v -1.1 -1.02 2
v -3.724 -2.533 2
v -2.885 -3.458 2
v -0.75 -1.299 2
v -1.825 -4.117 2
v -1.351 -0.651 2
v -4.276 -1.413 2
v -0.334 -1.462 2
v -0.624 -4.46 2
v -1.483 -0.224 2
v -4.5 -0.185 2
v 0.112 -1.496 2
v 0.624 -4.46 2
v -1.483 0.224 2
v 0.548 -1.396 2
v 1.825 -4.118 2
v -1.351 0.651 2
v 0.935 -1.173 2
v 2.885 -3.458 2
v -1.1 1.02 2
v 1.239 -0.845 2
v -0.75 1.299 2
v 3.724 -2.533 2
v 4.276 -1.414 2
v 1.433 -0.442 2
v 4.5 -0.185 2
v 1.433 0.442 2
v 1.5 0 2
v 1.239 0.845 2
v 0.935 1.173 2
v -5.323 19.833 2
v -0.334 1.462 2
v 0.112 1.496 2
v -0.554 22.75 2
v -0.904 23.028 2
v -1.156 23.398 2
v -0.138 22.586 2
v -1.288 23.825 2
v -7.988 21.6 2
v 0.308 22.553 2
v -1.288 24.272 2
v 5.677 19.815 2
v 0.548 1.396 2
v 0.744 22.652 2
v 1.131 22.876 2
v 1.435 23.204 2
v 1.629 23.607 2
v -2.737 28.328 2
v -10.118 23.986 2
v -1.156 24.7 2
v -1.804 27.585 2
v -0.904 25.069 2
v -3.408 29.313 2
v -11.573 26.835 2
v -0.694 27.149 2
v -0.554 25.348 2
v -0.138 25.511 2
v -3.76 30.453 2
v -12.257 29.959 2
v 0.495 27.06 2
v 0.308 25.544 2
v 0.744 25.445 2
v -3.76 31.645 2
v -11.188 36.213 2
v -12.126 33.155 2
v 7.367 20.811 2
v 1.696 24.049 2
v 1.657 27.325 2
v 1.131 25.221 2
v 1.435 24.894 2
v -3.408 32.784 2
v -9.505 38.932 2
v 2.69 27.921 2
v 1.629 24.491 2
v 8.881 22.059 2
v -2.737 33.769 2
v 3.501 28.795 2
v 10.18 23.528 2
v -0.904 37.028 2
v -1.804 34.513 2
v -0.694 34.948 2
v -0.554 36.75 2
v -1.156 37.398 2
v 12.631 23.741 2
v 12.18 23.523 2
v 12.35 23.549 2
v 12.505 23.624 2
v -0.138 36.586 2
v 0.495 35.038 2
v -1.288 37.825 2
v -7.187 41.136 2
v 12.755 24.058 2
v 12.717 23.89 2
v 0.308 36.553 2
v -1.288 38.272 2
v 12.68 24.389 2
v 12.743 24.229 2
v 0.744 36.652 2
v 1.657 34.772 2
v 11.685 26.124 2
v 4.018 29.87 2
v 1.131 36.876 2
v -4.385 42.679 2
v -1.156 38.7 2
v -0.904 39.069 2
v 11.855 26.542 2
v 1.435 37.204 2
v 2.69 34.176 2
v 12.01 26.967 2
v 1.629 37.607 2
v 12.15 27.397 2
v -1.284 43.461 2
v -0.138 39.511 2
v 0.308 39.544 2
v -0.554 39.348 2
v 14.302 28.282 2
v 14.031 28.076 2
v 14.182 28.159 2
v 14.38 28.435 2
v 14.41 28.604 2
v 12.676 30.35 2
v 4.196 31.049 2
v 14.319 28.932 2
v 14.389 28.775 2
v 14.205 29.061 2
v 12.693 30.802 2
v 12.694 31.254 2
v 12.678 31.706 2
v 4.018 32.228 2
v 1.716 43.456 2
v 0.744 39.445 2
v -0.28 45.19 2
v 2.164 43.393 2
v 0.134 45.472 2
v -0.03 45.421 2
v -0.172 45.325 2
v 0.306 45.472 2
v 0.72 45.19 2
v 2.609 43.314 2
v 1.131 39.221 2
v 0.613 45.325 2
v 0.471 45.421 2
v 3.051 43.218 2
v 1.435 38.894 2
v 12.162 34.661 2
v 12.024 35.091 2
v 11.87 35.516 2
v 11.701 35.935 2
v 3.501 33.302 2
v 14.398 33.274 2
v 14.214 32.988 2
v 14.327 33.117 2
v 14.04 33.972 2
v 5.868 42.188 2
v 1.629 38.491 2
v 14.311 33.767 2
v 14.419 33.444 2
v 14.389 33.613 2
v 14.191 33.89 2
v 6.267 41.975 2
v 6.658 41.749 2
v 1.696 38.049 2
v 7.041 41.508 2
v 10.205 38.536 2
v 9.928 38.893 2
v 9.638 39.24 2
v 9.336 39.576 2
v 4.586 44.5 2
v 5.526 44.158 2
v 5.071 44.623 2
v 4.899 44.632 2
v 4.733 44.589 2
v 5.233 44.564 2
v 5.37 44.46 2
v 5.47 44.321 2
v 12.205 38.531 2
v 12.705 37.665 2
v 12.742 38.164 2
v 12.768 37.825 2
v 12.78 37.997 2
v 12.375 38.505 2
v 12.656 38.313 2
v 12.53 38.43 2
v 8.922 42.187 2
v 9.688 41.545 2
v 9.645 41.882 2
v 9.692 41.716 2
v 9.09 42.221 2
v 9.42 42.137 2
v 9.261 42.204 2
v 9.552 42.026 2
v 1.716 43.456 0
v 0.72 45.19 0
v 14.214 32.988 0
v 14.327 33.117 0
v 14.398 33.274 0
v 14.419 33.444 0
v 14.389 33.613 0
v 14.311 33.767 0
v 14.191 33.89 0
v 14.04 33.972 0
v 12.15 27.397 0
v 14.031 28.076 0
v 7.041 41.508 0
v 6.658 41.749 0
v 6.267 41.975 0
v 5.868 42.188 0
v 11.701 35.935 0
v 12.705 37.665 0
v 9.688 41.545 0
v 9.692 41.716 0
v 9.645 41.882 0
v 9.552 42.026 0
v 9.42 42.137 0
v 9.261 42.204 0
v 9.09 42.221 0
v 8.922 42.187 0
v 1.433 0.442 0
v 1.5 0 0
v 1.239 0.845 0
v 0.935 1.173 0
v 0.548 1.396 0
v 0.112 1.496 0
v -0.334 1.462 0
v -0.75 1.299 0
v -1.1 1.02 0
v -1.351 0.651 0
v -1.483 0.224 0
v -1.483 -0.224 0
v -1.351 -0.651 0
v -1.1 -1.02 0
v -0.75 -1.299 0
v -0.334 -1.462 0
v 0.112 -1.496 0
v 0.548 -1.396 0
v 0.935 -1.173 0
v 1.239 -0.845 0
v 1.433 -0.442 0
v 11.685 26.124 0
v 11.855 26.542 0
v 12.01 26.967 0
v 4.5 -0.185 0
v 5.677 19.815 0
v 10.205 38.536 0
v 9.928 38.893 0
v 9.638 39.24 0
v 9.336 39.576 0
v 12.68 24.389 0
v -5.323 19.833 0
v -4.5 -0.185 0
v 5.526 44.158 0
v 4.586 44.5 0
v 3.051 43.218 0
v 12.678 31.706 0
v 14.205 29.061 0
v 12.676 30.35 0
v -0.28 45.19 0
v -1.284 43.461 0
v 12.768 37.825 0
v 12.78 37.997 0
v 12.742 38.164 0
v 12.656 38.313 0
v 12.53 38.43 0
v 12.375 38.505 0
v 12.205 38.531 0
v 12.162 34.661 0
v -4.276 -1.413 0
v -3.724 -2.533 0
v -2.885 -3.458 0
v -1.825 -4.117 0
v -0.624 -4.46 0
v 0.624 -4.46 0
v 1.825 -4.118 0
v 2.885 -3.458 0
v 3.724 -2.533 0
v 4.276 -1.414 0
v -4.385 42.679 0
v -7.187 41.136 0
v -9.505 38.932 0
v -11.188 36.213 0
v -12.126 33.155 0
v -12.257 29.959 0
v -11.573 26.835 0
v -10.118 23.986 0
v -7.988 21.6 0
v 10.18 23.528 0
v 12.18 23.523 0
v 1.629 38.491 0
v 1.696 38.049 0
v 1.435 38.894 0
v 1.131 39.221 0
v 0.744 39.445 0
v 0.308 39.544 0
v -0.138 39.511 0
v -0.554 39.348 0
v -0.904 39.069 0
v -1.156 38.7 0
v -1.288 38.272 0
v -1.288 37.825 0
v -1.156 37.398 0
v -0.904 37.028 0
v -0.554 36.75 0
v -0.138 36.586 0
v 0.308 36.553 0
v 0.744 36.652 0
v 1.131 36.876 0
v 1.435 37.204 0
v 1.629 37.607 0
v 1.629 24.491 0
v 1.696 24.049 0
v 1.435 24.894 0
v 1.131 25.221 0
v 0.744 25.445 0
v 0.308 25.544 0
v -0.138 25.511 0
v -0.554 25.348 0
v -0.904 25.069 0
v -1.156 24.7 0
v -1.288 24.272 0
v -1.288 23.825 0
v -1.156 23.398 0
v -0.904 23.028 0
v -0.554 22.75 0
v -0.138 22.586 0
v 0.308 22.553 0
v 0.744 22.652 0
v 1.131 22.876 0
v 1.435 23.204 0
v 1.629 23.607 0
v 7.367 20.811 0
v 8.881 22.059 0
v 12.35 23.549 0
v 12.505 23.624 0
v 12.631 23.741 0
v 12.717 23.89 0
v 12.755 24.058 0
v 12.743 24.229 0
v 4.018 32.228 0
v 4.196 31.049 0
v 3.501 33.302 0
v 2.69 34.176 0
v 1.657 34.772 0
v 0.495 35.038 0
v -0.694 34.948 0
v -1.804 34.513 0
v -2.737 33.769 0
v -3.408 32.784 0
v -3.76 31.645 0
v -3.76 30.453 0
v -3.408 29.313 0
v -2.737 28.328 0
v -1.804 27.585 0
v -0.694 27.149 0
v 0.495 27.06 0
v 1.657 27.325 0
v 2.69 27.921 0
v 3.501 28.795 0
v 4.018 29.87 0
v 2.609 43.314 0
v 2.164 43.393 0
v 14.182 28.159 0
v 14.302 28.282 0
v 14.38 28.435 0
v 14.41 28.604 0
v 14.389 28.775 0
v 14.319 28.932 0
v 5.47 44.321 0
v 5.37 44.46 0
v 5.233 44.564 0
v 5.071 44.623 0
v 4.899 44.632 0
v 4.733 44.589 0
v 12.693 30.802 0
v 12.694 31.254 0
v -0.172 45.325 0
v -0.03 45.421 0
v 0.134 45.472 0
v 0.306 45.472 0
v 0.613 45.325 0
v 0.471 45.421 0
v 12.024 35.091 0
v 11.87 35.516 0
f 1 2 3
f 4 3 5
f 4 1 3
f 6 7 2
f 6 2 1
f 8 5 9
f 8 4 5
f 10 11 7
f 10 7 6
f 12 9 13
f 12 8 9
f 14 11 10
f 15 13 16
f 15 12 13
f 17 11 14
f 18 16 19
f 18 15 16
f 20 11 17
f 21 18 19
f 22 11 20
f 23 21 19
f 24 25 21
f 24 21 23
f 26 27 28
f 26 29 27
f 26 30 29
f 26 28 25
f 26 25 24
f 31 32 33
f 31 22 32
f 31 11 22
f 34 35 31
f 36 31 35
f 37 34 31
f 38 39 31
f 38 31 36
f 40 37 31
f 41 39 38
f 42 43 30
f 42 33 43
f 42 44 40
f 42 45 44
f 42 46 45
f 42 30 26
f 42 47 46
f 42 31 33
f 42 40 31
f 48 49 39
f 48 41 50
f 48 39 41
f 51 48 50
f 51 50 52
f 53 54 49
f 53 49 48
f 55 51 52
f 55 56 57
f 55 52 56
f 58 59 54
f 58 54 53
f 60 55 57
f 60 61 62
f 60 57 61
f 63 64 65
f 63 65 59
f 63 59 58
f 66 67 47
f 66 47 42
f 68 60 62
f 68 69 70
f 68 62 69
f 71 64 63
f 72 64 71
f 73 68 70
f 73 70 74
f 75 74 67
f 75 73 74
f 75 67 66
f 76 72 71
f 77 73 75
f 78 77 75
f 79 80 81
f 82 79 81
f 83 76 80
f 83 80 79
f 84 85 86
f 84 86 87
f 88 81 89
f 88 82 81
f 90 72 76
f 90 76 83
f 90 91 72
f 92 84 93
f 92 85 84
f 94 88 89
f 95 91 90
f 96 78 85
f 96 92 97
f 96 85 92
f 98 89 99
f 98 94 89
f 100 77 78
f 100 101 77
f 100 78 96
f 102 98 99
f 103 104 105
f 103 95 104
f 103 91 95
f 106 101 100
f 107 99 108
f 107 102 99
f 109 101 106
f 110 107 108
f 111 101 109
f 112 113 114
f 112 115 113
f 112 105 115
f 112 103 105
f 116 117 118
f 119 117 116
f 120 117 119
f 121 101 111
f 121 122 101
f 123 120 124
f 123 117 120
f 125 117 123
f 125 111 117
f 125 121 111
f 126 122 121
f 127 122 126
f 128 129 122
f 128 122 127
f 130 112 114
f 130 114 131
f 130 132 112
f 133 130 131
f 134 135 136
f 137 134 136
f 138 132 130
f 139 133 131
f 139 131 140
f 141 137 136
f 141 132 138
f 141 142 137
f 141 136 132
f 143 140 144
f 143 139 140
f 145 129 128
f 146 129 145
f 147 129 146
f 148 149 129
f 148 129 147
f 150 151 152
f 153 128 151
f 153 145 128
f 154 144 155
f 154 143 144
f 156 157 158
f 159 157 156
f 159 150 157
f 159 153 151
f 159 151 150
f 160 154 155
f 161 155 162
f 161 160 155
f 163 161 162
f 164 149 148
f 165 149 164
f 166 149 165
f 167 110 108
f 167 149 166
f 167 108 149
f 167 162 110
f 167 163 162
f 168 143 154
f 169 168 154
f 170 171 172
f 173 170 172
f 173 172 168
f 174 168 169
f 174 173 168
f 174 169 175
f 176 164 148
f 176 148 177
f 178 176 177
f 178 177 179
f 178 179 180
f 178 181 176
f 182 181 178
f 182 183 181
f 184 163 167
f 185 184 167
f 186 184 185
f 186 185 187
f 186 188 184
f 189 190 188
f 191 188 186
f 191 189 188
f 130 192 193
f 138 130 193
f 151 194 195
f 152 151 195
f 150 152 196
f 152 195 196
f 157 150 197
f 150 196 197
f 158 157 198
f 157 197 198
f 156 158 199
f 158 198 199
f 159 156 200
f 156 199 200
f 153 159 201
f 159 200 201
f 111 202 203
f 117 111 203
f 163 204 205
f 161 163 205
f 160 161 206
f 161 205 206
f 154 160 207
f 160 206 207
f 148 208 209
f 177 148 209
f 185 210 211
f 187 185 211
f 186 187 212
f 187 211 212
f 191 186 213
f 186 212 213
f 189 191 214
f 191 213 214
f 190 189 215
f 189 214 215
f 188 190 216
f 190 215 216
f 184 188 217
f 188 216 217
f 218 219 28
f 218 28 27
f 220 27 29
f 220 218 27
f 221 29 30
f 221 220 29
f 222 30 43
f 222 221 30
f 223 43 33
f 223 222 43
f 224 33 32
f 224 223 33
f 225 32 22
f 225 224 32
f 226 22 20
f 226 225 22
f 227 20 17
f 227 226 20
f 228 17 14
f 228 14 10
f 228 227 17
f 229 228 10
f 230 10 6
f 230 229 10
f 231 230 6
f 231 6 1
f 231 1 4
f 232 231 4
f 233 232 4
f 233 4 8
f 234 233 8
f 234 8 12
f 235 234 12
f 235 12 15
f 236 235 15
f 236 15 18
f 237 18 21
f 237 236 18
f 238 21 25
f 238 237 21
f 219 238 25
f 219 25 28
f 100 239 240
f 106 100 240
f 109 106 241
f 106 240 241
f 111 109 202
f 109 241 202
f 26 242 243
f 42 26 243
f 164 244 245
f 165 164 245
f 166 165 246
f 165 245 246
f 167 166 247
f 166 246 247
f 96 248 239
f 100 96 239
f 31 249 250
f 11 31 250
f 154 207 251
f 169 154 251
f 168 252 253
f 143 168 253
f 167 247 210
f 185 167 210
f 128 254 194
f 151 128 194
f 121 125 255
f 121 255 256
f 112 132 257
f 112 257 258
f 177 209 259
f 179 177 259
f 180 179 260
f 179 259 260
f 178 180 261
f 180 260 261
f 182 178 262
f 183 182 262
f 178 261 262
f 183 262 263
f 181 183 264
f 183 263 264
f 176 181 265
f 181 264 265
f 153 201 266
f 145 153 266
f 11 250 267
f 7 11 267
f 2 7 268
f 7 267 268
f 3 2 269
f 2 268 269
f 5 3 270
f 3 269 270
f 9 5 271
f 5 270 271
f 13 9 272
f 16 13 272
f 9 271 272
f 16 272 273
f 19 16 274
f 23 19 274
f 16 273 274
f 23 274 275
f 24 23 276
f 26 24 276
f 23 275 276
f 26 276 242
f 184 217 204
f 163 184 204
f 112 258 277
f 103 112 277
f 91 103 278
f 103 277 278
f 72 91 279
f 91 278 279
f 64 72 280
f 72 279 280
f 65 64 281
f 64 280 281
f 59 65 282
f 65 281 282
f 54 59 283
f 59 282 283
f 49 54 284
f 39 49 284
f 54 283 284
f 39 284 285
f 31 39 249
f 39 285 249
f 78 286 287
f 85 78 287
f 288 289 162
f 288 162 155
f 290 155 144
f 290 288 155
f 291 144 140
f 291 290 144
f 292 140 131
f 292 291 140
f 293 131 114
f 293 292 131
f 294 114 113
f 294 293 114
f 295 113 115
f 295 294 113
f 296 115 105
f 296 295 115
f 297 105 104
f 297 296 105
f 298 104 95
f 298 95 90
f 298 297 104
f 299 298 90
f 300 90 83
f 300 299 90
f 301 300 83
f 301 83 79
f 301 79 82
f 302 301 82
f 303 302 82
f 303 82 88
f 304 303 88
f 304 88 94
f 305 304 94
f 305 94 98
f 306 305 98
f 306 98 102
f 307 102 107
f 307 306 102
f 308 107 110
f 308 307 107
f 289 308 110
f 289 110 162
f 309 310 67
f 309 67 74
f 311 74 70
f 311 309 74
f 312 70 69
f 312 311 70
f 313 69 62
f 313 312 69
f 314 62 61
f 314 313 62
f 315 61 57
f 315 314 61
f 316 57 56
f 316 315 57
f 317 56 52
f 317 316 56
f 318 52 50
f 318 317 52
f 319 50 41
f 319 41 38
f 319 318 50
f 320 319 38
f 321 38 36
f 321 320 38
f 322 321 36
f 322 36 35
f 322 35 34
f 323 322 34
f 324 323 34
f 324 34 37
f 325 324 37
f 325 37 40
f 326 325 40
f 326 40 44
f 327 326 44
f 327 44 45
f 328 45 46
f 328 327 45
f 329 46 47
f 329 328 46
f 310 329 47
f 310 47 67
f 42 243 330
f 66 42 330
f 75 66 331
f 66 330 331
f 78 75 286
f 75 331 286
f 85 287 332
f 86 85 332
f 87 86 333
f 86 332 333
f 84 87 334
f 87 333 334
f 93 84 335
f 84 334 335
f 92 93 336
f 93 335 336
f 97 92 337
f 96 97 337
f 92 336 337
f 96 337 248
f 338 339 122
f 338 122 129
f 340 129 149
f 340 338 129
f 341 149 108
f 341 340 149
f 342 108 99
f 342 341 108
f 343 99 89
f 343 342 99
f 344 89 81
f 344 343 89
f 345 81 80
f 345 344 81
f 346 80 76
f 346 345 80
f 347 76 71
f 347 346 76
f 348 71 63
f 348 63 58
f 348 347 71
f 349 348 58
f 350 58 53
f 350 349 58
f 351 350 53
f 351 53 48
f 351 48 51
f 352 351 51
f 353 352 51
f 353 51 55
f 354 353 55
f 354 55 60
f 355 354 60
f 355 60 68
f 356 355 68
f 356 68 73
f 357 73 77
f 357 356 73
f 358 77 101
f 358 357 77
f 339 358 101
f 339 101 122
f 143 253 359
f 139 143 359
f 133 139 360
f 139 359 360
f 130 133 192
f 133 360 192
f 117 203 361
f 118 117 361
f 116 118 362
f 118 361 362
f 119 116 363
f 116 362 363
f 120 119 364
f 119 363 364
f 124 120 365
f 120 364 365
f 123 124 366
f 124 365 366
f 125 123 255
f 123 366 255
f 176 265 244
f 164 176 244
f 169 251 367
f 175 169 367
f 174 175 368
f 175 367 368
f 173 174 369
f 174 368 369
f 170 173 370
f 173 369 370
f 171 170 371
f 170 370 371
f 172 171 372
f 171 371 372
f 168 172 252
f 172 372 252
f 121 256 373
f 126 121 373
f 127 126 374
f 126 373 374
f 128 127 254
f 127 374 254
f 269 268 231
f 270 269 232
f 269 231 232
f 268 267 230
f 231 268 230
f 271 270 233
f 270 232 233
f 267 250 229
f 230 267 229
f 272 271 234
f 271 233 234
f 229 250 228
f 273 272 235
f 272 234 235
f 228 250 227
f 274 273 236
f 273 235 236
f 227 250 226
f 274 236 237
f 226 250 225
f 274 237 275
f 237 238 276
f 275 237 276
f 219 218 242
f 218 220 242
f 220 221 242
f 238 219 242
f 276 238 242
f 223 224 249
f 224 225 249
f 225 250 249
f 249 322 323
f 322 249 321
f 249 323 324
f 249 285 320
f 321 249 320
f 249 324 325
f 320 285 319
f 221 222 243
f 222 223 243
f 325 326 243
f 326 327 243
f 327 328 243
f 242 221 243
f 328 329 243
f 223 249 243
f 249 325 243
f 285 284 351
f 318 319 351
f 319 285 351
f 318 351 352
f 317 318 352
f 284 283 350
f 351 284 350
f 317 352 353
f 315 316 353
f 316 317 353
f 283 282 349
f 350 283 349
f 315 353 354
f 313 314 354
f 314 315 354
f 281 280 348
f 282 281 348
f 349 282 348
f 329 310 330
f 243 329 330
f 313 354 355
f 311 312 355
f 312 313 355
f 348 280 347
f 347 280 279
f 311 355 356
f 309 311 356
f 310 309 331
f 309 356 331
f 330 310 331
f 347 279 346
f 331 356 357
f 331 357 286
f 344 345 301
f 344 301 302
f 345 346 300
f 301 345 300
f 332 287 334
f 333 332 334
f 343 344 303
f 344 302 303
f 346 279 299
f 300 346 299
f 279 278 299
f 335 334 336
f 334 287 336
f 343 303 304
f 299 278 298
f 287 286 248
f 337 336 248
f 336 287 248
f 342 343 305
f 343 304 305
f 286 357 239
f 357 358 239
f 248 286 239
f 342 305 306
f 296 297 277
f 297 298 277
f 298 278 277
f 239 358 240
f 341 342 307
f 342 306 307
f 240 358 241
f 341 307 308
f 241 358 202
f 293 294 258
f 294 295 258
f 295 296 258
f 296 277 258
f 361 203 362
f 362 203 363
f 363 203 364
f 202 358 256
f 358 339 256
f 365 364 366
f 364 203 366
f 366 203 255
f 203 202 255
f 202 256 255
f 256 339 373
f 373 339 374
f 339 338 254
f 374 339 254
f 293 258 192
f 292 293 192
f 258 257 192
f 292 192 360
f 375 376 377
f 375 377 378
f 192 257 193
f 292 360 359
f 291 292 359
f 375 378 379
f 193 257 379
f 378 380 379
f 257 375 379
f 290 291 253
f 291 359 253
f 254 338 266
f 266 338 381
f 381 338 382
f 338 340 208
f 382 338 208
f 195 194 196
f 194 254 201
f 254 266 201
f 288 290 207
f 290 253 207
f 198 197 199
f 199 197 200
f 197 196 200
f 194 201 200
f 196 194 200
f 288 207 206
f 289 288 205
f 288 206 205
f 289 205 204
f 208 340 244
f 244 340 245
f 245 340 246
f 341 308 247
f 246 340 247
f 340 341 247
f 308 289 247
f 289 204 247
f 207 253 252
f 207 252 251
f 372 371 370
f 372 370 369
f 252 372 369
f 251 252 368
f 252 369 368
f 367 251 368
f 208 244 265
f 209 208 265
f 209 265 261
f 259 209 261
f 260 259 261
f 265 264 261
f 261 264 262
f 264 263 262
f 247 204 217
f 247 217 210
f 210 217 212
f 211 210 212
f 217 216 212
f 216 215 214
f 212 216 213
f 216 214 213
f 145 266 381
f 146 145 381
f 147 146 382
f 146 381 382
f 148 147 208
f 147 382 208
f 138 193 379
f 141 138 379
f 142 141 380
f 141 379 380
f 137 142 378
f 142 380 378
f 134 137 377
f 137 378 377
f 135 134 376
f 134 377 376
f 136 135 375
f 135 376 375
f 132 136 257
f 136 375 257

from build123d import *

# Parameters (mm, degrees)
SKETCH1_R           = 4
SKETCH1_R_2         = 1.5
BOSS_EXTRUDE1_DEPTH = 2


with BuildPart() as part:
    # Sketch1 → Boss-Extrude1 (new body)
    with BuildSketch(Plane.XY):
        with BuildLine():
            Line((-5.322767432, 19.832757644), (-4.500006862, -0.184957582))
            ThreePointArc((-4.500006862, -0.184957582), (-0.000167017, -4.503806283), (4.499993132, -0.185291335))
            Line((4.499993132, -0.185291335), (5.67721776, 19.814708665))
            ThreePointArc((5.67721776, 19.814708665), (8.148561948, 21.404983206), (10.180318916, 23.528301089))
            Line((10.180318916, 23.528301089), (12.180312779, 23.523346368))
            ThreePointArc((12.180312779, 23.523346368), (12.679597114, 23.812434692), (12.680312779, 24.389371772))
            Line((12.680312779, 24.389371772), (11.684612917, 26.123898158))
            ThreePointArc((11.684612917, 26.123898158), (11.934719035, 26.754030681), (12.150293859, 27.396796239))
            Line((12.150293859, 27.396796239), (14.031367948, 28.076178512))
            ThreePointArc((14.031367948, 28.076178512), (14.401667723, 28.518597977), (14.205016126, 29.060986265))
            Line((14.205016126, 29.060986265), (12.67612135, 30.350358501))
            ThreePointArc((12.67612135, 30.350358501), (12.695626208, 31.028030714), (12.678361511, 31.705763698))
            Line((12.678361511, 31.705763698), (14.213630529, 32.987539436))
            ThreePointArc((14.213630529, 32.987539436), (14.410282126, 33.529927724), (14.039982351, 33.972347189))
            Line((14.039982351, 33.972347189), (12.162299935, 34.661047954))
            ThreePointArc((12.162299935, 34.661047954), (11.948850959, 35.304522586), (11.700829119, 35.935478396))
            Line((11.700829119, 35.935478396), (12.705116964, 37.665046528))
            ThreePointArc((12.705116964, 37.665046528), (12.704401299, 38.241983607), (12.205116964, 38.531071932))
            Line((12.205116964, 38.531071932), (10.205123119, 38.536033749))
            ThreePointArc((10.205123119, 38.536033749), (9.784465406, 39.067698263), (9.335601516, 39.575774317))
            Line((9.335601516, 39.575774317), (9.687776253, 41.5445234))
            ThreePointArc((9.687776253, 41.5445234), (9.489779645, 42.086422145), (8.92173181, 42.18731101))
            Line((8.92173181, 42.18731101), (7.040655311, 41.507935412))
            ThreePointArc((7.040655311, 41.507935412), (6.463526388, 41.863663221), (5.867960059, 42.187578047))
            Line((5.867960059, 42.187578047), (5.525544216, 44.158047887))
            ThreePointArc((5.525544216, 44.158047887), (5.154147979, 44.59954731), (4.585851596, 44.500068031))
            Line((4.585851596, 44.500068031), (3.050578029, 43.21829774))
            ThreePointArc((3.050578029, 43.21829774), (2.386588163, 43.355182821), (1.716153483, 43.455867511))
            Line((1.716153483, 43.455867511), (0.720447466, 45.190390364))
            ThreePointArc((0.720447466, 45.190390364), (0.220447466, 45.47823912), (-0.279552534, 45.190390364))
            Line((-0.279552534, 45.190390364), (-1.283846517, 43.460825796))
            ThreePointArc((-1.283846517, 43.460825796), (-12.125641313, 33.154858755), (-5.322767432, 19.832757644))
        make_face()
        with Locations((0.19564328, 31.048690205)):
            Circle(SKETCH1_R, mode=Mode.SUBTRACT)
        with Locations((0.19564328, 38.048690205)):
            Circle(SKETCH1_R_2, mode=Mode.SUBTRACT)
        with Locations((0.19564328, 24.048690205)):
            Circle(SKETCH1_R_2, mode=Mode.SUBTRACT)
        Circle(SKETCH1_R_2, mode=Mode.SUBTRACT)
    extrude(amount=BOSS_EXTRUDE1_DEPTH)


solid = part.part
